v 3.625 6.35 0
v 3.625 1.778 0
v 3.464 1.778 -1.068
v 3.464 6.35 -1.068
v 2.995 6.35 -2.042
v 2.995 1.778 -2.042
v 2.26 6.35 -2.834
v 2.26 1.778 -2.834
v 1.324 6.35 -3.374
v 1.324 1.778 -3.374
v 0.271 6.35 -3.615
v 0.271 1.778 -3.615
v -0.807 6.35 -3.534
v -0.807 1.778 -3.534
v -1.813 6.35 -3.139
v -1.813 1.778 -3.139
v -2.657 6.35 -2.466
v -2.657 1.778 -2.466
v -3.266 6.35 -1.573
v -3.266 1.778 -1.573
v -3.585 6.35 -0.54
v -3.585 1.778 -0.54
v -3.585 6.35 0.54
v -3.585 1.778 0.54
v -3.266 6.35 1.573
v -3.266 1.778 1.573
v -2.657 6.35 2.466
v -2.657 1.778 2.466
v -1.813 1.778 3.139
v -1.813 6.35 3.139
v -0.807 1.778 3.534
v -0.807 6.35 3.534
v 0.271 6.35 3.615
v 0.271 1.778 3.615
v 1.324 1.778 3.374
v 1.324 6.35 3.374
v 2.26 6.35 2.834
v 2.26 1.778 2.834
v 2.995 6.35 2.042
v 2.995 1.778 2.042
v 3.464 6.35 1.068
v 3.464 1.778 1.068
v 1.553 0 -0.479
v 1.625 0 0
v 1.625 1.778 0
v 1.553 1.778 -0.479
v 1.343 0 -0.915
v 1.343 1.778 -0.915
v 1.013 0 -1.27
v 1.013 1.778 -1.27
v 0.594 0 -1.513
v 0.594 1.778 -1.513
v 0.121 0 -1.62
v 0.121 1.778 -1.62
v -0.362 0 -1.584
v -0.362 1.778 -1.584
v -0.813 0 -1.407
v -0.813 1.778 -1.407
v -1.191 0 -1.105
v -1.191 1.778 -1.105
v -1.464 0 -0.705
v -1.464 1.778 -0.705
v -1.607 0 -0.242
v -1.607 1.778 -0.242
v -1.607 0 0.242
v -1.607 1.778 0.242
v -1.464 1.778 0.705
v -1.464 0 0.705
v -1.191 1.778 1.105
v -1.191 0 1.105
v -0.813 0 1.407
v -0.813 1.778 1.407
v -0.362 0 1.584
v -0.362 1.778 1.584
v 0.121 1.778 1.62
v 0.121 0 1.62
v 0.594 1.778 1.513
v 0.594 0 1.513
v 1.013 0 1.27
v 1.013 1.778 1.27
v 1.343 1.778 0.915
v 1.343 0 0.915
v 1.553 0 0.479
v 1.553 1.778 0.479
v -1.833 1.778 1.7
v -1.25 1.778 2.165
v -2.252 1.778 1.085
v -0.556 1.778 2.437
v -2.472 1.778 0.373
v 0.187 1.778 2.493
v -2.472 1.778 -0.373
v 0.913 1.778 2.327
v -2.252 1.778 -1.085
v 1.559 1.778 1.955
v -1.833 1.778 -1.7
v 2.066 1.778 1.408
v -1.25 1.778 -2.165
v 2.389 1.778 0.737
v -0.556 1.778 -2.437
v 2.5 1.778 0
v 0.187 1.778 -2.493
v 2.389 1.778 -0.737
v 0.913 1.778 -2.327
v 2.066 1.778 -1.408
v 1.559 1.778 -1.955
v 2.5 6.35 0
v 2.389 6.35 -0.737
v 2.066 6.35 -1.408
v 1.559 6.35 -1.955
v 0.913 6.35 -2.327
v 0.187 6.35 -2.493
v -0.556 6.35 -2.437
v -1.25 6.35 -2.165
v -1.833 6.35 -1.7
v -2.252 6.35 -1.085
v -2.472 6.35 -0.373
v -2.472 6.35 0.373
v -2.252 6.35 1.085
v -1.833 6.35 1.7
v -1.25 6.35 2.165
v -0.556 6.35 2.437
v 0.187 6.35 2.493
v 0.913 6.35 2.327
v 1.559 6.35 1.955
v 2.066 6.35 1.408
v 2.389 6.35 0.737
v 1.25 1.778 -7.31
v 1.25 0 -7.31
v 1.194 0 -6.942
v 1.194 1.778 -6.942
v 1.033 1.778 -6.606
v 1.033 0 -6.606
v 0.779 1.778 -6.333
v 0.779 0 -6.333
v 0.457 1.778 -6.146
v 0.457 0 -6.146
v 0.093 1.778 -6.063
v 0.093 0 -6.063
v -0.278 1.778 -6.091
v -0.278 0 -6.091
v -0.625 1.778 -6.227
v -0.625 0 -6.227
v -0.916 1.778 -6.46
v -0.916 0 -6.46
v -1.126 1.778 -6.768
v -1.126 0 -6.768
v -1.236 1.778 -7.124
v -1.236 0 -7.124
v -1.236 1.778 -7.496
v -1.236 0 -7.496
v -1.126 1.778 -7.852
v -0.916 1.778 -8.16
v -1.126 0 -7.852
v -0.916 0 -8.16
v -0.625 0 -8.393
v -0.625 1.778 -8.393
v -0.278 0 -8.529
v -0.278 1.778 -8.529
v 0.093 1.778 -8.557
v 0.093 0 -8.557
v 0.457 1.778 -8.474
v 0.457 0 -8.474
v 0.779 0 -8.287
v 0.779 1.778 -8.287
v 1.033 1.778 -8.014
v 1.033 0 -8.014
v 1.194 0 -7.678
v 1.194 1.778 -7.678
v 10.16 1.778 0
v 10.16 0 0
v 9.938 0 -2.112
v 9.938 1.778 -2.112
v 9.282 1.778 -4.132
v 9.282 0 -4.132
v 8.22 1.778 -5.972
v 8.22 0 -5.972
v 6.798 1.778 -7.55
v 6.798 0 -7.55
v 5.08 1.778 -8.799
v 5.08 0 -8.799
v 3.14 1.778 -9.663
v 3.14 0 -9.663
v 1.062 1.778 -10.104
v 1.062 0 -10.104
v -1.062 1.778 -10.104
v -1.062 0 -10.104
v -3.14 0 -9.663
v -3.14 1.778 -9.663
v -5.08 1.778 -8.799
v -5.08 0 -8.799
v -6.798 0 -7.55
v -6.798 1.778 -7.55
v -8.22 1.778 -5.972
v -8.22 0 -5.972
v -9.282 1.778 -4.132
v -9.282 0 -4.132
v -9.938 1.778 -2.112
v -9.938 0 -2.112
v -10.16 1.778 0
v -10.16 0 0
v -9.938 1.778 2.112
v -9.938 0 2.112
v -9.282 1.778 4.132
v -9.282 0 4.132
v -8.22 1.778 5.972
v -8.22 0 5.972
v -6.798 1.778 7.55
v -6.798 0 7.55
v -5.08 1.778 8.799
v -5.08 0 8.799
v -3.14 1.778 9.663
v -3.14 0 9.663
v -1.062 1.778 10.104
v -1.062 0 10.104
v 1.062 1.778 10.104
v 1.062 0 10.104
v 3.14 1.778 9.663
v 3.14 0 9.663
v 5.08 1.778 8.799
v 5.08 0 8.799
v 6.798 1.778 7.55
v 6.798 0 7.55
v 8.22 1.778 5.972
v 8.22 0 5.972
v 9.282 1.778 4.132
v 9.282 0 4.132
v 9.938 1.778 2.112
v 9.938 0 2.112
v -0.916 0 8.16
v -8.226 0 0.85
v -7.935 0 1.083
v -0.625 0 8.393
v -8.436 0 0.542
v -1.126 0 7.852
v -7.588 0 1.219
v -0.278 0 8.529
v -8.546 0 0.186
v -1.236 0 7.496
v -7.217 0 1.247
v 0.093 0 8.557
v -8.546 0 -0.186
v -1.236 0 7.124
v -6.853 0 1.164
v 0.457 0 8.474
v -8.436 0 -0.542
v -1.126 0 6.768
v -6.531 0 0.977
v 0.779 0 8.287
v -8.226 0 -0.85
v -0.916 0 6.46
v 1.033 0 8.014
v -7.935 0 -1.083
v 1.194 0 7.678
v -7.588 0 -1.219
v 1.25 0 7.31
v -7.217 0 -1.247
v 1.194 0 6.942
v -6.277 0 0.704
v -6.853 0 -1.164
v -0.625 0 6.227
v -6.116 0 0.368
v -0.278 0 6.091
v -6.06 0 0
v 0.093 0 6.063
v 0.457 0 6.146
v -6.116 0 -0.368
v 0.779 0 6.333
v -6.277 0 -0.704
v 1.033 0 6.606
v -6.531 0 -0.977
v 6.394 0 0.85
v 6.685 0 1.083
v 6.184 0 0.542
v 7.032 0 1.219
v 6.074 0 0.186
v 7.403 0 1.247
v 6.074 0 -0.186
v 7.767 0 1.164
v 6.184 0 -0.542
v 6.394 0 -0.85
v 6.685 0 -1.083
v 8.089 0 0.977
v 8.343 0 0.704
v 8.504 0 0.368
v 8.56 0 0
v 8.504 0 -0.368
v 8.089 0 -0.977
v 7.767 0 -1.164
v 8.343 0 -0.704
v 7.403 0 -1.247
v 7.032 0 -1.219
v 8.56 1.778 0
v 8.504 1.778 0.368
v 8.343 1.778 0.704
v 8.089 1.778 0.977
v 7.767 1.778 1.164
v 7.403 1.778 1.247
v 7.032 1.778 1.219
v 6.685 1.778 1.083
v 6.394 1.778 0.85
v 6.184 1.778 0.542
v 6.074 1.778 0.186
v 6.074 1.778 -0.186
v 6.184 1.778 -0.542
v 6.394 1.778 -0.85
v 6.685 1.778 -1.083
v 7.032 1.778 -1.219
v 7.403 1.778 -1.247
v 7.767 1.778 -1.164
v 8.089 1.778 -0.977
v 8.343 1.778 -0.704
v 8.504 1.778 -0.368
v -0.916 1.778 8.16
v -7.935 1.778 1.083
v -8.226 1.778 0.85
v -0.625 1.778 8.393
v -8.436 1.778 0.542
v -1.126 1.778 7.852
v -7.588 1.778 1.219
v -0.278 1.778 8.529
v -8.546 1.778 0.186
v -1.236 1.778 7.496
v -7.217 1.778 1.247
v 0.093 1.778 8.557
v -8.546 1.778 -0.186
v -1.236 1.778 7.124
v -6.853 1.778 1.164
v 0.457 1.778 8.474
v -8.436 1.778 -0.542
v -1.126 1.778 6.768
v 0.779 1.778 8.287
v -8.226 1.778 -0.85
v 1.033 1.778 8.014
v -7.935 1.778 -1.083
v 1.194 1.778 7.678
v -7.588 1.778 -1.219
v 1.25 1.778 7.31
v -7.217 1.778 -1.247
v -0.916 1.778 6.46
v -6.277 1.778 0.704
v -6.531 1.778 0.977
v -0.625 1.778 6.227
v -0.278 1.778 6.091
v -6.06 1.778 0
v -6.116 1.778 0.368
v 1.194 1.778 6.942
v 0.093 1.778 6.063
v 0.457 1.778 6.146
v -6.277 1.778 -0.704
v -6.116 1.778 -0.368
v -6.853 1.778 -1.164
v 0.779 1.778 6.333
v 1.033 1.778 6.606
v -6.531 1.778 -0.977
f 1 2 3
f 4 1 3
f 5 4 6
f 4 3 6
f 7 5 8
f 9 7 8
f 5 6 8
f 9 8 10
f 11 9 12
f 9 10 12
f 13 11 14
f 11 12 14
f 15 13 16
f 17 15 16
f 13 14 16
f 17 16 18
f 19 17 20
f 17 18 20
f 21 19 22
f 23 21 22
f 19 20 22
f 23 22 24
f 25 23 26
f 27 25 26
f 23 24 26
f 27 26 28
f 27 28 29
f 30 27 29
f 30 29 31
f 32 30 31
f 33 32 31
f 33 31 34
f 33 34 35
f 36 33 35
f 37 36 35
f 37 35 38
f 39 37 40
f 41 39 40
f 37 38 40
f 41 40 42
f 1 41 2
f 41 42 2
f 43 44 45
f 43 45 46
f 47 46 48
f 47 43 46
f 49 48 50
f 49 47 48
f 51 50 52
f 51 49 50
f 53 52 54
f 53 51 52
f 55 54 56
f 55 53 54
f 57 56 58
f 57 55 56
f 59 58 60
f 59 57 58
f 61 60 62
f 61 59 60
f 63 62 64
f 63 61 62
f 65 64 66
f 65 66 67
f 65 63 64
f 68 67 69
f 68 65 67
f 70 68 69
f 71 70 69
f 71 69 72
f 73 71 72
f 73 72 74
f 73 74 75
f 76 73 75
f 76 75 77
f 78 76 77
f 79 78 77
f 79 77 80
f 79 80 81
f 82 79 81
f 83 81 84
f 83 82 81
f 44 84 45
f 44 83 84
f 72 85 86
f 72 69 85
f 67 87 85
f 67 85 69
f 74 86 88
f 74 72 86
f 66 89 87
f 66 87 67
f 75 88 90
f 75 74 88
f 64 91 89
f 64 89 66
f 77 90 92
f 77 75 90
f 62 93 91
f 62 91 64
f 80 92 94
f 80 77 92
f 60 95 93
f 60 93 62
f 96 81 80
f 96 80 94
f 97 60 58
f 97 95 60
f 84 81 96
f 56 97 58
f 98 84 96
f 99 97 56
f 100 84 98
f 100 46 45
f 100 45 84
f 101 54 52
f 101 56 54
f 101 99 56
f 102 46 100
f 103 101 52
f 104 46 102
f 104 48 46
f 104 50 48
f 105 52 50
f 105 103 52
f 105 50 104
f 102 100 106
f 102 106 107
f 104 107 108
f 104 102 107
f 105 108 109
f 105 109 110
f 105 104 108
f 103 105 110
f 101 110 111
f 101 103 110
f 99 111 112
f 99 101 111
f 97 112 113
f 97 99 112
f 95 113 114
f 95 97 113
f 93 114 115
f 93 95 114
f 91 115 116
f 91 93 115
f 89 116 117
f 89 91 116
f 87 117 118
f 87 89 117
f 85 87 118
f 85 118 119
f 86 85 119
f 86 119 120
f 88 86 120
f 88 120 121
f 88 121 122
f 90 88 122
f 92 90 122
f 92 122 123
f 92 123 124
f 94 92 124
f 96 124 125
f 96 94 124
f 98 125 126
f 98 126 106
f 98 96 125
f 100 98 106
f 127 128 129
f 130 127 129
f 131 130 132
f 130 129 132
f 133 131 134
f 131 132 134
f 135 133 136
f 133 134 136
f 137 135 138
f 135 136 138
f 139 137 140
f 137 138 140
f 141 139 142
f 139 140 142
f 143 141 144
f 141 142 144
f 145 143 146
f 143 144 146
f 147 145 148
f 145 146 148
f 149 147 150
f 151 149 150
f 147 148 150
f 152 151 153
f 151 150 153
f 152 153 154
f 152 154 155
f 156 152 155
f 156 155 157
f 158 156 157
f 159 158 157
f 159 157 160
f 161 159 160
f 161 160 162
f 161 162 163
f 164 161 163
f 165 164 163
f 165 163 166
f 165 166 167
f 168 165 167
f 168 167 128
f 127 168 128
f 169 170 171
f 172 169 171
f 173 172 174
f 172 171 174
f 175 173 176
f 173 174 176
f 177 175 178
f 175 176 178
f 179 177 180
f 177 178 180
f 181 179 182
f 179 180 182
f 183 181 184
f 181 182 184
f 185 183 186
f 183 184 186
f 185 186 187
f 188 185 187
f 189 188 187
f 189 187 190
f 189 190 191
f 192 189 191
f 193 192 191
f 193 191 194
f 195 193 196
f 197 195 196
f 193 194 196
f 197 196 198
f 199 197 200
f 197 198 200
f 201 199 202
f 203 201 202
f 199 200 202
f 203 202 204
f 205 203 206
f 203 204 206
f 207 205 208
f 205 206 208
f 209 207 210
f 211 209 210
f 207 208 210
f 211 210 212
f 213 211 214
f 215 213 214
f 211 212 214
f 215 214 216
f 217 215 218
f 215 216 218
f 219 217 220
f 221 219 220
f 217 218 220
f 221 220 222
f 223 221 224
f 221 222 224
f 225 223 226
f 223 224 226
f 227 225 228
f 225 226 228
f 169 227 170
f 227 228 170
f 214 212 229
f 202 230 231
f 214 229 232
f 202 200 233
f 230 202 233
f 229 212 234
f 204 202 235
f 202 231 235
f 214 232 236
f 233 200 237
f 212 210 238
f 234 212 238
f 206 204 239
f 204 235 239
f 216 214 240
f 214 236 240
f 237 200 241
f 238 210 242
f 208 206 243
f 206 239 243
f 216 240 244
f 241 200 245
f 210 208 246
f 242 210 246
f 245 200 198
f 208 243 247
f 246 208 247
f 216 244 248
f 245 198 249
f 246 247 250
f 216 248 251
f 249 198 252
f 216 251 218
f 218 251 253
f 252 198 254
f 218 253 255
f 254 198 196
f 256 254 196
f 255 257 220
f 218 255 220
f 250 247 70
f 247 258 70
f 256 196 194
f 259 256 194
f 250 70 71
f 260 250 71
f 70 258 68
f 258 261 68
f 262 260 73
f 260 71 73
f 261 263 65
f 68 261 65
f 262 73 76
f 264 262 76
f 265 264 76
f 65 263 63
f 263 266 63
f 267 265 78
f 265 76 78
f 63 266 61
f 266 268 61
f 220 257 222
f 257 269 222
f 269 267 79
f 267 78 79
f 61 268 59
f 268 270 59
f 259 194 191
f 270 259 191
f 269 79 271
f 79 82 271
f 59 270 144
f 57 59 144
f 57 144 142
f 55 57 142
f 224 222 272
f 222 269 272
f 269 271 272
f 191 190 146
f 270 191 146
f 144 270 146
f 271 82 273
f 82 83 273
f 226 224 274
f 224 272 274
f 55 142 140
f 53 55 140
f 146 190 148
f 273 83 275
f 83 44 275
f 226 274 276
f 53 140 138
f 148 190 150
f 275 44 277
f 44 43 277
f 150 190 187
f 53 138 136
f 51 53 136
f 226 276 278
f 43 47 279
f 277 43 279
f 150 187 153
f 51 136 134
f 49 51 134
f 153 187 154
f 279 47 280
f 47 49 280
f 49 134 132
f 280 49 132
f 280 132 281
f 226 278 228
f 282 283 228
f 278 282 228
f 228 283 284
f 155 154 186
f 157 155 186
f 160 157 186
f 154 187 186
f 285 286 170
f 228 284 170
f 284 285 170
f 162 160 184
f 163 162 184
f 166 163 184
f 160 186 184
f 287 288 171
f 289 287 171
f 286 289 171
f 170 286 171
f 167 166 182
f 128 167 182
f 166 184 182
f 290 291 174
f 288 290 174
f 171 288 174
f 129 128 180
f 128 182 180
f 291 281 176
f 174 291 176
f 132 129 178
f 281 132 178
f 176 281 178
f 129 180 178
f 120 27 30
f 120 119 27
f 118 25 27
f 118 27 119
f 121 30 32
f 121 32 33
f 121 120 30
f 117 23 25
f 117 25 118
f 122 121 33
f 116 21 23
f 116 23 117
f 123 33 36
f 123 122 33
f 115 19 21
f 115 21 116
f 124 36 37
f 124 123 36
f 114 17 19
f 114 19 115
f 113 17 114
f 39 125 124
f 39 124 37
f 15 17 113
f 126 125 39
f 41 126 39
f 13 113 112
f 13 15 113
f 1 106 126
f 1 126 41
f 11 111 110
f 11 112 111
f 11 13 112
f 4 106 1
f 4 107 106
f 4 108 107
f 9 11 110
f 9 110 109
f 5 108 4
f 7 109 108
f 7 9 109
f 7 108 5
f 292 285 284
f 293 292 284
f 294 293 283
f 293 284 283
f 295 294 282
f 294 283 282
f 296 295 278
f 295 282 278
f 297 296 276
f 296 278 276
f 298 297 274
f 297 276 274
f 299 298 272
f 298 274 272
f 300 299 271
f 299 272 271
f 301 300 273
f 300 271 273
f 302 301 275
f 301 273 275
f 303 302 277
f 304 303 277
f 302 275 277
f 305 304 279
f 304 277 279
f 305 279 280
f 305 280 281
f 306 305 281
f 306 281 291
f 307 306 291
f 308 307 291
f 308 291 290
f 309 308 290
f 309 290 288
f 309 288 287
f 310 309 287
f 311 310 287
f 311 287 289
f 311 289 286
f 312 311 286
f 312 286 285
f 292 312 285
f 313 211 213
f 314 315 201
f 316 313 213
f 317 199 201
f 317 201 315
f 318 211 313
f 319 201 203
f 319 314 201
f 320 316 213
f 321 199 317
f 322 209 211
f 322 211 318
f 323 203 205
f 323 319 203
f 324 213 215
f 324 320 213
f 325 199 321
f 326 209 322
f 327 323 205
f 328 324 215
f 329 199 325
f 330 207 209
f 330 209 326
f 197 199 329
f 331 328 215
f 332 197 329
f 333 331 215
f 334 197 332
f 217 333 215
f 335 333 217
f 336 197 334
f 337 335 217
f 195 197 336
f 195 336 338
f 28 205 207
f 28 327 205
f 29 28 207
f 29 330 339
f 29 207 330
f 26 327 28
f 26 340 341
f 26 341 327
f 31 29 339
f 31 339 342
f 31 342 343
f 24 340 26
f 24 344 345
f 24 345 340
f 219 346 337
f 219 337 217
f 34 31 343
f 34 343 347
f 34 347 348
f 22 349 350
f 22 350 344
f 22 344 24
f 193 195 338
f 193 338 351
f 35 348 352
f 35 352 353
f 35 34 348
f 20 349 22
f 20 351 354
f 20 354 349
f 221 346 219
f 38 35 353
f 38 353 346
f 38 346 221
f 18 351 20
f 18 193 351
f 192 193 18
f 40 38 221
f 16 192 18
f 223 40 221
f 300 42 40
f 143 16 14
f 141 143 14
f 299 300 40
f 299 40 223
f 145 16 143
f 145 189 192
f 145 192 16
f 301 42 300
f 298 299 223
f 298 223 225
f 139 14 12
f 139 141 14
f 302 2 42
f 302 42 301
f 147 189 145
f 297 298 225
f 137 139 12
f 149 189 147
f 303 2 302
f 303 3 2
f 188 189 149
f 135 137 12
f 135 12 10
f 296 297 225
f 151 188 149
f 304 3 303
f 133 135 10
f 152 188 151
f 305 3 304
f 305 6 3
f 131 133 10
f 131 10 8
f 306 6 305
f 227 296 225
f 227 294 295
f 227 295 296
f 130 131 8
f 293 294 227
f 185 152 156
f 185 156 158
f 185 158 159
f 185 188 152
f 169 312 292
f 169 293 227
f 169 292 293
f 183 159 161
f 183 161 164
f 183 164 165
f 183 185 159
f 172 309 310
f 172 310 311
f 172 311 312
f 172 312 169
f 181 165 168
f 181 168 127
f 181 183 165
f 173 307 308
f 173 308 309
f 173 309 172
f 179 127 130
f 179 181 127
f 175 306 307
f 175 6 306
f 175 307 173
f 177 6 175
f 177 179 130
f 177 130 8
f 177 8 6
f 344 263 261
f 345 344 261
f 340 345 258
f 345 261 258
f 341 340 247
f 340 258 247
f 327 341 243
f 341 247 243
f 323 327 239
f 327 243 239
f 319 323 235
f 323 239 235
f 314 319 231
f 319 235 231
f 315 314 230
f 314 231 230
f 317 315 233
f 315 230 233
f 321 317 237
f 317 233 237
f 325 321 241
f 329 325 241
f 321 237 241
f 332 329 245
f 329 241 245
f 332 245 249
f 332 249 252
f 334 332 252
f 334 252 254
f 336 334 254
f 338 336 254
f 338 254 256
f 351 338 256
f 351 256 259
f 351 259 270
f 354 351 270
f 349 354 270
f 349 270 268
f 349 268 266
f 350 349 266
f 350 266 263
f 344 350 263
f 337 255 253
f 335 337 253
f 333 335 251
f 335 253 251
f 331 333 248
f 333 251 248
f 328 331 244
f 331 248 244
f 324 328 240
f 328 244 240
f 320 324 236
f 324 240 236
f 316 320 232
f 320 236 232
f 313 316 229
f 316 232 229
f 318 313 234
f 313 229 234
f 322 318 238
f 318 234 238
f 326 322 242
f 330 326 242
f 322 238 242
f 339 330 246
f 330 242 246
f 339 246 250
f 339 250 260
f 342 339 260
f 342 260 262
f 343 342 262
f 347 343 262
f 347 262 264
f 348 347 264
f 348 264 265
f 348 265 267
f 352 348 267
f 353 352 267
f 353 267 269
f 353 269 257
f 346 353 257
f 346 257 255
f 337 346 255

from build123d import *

# Parameters (mm, degrees)
SKETCH1_R           = 10.16
SKETCH1_R_2         = 1.625
BOSS_EXTRUDE2_DEPTH = 1.778
SKETCH3_R           = 3.625
SKETCH3_R_2         = 2.5
BOSS_EXTRUDE3_DEPTH = 4.572
SKETCH4_R           = 1.25
CUT_EXTRUDE1_DEPTH  = 7.35


with BuildPart() as part:
    # Sketch1 → Boss-Extrude2 (new body)
    with BuildSketch(Plane(origin=(0, 0, 0), x_dir=(1, 0, 0), z_dir=(0, 1, 0))):
        Circle(SKETCH1_R)
        Circle(SKETCH1_R_2, mode=Mode.SUBTRACT)
    extrude(amount=BOSS_EXTRUDE2_DEPTH)

    # Sketch3 → Boss-Extrude3 (add)
    with BuildSketch(Plane(origin=(0, 1.778, 0), x_dir=(1, 0, 0), z_dir=(0, 1, 0))):
        Circle(SKETCH3_R)
        Circle(SKETCH3_R_2, mode=Mode.SUBTRACT)
    extrude(amount=BOSS_EXTRUDE3_DEPTH)

    # Sketch4 → Cut-Extrude1 (cut, through all)
    with BuildSketch(Plane.XZ):
        with Locations((0, 7.31)):
            Circle(SKETCH4_R)
        with Locations((7.31, 0)):
            Circle(SKETCH4_R)
        with Locations((-7.31, 0)):
            Circle(SKETCH4_R)
        with Locations((0, -7.31)):
            Circle(SKETCH4_R)
    extrude(amount=-CUT_EXTRUDE1_DEPTH, mode=Mode.SUBTRACT)


solid = part.part
